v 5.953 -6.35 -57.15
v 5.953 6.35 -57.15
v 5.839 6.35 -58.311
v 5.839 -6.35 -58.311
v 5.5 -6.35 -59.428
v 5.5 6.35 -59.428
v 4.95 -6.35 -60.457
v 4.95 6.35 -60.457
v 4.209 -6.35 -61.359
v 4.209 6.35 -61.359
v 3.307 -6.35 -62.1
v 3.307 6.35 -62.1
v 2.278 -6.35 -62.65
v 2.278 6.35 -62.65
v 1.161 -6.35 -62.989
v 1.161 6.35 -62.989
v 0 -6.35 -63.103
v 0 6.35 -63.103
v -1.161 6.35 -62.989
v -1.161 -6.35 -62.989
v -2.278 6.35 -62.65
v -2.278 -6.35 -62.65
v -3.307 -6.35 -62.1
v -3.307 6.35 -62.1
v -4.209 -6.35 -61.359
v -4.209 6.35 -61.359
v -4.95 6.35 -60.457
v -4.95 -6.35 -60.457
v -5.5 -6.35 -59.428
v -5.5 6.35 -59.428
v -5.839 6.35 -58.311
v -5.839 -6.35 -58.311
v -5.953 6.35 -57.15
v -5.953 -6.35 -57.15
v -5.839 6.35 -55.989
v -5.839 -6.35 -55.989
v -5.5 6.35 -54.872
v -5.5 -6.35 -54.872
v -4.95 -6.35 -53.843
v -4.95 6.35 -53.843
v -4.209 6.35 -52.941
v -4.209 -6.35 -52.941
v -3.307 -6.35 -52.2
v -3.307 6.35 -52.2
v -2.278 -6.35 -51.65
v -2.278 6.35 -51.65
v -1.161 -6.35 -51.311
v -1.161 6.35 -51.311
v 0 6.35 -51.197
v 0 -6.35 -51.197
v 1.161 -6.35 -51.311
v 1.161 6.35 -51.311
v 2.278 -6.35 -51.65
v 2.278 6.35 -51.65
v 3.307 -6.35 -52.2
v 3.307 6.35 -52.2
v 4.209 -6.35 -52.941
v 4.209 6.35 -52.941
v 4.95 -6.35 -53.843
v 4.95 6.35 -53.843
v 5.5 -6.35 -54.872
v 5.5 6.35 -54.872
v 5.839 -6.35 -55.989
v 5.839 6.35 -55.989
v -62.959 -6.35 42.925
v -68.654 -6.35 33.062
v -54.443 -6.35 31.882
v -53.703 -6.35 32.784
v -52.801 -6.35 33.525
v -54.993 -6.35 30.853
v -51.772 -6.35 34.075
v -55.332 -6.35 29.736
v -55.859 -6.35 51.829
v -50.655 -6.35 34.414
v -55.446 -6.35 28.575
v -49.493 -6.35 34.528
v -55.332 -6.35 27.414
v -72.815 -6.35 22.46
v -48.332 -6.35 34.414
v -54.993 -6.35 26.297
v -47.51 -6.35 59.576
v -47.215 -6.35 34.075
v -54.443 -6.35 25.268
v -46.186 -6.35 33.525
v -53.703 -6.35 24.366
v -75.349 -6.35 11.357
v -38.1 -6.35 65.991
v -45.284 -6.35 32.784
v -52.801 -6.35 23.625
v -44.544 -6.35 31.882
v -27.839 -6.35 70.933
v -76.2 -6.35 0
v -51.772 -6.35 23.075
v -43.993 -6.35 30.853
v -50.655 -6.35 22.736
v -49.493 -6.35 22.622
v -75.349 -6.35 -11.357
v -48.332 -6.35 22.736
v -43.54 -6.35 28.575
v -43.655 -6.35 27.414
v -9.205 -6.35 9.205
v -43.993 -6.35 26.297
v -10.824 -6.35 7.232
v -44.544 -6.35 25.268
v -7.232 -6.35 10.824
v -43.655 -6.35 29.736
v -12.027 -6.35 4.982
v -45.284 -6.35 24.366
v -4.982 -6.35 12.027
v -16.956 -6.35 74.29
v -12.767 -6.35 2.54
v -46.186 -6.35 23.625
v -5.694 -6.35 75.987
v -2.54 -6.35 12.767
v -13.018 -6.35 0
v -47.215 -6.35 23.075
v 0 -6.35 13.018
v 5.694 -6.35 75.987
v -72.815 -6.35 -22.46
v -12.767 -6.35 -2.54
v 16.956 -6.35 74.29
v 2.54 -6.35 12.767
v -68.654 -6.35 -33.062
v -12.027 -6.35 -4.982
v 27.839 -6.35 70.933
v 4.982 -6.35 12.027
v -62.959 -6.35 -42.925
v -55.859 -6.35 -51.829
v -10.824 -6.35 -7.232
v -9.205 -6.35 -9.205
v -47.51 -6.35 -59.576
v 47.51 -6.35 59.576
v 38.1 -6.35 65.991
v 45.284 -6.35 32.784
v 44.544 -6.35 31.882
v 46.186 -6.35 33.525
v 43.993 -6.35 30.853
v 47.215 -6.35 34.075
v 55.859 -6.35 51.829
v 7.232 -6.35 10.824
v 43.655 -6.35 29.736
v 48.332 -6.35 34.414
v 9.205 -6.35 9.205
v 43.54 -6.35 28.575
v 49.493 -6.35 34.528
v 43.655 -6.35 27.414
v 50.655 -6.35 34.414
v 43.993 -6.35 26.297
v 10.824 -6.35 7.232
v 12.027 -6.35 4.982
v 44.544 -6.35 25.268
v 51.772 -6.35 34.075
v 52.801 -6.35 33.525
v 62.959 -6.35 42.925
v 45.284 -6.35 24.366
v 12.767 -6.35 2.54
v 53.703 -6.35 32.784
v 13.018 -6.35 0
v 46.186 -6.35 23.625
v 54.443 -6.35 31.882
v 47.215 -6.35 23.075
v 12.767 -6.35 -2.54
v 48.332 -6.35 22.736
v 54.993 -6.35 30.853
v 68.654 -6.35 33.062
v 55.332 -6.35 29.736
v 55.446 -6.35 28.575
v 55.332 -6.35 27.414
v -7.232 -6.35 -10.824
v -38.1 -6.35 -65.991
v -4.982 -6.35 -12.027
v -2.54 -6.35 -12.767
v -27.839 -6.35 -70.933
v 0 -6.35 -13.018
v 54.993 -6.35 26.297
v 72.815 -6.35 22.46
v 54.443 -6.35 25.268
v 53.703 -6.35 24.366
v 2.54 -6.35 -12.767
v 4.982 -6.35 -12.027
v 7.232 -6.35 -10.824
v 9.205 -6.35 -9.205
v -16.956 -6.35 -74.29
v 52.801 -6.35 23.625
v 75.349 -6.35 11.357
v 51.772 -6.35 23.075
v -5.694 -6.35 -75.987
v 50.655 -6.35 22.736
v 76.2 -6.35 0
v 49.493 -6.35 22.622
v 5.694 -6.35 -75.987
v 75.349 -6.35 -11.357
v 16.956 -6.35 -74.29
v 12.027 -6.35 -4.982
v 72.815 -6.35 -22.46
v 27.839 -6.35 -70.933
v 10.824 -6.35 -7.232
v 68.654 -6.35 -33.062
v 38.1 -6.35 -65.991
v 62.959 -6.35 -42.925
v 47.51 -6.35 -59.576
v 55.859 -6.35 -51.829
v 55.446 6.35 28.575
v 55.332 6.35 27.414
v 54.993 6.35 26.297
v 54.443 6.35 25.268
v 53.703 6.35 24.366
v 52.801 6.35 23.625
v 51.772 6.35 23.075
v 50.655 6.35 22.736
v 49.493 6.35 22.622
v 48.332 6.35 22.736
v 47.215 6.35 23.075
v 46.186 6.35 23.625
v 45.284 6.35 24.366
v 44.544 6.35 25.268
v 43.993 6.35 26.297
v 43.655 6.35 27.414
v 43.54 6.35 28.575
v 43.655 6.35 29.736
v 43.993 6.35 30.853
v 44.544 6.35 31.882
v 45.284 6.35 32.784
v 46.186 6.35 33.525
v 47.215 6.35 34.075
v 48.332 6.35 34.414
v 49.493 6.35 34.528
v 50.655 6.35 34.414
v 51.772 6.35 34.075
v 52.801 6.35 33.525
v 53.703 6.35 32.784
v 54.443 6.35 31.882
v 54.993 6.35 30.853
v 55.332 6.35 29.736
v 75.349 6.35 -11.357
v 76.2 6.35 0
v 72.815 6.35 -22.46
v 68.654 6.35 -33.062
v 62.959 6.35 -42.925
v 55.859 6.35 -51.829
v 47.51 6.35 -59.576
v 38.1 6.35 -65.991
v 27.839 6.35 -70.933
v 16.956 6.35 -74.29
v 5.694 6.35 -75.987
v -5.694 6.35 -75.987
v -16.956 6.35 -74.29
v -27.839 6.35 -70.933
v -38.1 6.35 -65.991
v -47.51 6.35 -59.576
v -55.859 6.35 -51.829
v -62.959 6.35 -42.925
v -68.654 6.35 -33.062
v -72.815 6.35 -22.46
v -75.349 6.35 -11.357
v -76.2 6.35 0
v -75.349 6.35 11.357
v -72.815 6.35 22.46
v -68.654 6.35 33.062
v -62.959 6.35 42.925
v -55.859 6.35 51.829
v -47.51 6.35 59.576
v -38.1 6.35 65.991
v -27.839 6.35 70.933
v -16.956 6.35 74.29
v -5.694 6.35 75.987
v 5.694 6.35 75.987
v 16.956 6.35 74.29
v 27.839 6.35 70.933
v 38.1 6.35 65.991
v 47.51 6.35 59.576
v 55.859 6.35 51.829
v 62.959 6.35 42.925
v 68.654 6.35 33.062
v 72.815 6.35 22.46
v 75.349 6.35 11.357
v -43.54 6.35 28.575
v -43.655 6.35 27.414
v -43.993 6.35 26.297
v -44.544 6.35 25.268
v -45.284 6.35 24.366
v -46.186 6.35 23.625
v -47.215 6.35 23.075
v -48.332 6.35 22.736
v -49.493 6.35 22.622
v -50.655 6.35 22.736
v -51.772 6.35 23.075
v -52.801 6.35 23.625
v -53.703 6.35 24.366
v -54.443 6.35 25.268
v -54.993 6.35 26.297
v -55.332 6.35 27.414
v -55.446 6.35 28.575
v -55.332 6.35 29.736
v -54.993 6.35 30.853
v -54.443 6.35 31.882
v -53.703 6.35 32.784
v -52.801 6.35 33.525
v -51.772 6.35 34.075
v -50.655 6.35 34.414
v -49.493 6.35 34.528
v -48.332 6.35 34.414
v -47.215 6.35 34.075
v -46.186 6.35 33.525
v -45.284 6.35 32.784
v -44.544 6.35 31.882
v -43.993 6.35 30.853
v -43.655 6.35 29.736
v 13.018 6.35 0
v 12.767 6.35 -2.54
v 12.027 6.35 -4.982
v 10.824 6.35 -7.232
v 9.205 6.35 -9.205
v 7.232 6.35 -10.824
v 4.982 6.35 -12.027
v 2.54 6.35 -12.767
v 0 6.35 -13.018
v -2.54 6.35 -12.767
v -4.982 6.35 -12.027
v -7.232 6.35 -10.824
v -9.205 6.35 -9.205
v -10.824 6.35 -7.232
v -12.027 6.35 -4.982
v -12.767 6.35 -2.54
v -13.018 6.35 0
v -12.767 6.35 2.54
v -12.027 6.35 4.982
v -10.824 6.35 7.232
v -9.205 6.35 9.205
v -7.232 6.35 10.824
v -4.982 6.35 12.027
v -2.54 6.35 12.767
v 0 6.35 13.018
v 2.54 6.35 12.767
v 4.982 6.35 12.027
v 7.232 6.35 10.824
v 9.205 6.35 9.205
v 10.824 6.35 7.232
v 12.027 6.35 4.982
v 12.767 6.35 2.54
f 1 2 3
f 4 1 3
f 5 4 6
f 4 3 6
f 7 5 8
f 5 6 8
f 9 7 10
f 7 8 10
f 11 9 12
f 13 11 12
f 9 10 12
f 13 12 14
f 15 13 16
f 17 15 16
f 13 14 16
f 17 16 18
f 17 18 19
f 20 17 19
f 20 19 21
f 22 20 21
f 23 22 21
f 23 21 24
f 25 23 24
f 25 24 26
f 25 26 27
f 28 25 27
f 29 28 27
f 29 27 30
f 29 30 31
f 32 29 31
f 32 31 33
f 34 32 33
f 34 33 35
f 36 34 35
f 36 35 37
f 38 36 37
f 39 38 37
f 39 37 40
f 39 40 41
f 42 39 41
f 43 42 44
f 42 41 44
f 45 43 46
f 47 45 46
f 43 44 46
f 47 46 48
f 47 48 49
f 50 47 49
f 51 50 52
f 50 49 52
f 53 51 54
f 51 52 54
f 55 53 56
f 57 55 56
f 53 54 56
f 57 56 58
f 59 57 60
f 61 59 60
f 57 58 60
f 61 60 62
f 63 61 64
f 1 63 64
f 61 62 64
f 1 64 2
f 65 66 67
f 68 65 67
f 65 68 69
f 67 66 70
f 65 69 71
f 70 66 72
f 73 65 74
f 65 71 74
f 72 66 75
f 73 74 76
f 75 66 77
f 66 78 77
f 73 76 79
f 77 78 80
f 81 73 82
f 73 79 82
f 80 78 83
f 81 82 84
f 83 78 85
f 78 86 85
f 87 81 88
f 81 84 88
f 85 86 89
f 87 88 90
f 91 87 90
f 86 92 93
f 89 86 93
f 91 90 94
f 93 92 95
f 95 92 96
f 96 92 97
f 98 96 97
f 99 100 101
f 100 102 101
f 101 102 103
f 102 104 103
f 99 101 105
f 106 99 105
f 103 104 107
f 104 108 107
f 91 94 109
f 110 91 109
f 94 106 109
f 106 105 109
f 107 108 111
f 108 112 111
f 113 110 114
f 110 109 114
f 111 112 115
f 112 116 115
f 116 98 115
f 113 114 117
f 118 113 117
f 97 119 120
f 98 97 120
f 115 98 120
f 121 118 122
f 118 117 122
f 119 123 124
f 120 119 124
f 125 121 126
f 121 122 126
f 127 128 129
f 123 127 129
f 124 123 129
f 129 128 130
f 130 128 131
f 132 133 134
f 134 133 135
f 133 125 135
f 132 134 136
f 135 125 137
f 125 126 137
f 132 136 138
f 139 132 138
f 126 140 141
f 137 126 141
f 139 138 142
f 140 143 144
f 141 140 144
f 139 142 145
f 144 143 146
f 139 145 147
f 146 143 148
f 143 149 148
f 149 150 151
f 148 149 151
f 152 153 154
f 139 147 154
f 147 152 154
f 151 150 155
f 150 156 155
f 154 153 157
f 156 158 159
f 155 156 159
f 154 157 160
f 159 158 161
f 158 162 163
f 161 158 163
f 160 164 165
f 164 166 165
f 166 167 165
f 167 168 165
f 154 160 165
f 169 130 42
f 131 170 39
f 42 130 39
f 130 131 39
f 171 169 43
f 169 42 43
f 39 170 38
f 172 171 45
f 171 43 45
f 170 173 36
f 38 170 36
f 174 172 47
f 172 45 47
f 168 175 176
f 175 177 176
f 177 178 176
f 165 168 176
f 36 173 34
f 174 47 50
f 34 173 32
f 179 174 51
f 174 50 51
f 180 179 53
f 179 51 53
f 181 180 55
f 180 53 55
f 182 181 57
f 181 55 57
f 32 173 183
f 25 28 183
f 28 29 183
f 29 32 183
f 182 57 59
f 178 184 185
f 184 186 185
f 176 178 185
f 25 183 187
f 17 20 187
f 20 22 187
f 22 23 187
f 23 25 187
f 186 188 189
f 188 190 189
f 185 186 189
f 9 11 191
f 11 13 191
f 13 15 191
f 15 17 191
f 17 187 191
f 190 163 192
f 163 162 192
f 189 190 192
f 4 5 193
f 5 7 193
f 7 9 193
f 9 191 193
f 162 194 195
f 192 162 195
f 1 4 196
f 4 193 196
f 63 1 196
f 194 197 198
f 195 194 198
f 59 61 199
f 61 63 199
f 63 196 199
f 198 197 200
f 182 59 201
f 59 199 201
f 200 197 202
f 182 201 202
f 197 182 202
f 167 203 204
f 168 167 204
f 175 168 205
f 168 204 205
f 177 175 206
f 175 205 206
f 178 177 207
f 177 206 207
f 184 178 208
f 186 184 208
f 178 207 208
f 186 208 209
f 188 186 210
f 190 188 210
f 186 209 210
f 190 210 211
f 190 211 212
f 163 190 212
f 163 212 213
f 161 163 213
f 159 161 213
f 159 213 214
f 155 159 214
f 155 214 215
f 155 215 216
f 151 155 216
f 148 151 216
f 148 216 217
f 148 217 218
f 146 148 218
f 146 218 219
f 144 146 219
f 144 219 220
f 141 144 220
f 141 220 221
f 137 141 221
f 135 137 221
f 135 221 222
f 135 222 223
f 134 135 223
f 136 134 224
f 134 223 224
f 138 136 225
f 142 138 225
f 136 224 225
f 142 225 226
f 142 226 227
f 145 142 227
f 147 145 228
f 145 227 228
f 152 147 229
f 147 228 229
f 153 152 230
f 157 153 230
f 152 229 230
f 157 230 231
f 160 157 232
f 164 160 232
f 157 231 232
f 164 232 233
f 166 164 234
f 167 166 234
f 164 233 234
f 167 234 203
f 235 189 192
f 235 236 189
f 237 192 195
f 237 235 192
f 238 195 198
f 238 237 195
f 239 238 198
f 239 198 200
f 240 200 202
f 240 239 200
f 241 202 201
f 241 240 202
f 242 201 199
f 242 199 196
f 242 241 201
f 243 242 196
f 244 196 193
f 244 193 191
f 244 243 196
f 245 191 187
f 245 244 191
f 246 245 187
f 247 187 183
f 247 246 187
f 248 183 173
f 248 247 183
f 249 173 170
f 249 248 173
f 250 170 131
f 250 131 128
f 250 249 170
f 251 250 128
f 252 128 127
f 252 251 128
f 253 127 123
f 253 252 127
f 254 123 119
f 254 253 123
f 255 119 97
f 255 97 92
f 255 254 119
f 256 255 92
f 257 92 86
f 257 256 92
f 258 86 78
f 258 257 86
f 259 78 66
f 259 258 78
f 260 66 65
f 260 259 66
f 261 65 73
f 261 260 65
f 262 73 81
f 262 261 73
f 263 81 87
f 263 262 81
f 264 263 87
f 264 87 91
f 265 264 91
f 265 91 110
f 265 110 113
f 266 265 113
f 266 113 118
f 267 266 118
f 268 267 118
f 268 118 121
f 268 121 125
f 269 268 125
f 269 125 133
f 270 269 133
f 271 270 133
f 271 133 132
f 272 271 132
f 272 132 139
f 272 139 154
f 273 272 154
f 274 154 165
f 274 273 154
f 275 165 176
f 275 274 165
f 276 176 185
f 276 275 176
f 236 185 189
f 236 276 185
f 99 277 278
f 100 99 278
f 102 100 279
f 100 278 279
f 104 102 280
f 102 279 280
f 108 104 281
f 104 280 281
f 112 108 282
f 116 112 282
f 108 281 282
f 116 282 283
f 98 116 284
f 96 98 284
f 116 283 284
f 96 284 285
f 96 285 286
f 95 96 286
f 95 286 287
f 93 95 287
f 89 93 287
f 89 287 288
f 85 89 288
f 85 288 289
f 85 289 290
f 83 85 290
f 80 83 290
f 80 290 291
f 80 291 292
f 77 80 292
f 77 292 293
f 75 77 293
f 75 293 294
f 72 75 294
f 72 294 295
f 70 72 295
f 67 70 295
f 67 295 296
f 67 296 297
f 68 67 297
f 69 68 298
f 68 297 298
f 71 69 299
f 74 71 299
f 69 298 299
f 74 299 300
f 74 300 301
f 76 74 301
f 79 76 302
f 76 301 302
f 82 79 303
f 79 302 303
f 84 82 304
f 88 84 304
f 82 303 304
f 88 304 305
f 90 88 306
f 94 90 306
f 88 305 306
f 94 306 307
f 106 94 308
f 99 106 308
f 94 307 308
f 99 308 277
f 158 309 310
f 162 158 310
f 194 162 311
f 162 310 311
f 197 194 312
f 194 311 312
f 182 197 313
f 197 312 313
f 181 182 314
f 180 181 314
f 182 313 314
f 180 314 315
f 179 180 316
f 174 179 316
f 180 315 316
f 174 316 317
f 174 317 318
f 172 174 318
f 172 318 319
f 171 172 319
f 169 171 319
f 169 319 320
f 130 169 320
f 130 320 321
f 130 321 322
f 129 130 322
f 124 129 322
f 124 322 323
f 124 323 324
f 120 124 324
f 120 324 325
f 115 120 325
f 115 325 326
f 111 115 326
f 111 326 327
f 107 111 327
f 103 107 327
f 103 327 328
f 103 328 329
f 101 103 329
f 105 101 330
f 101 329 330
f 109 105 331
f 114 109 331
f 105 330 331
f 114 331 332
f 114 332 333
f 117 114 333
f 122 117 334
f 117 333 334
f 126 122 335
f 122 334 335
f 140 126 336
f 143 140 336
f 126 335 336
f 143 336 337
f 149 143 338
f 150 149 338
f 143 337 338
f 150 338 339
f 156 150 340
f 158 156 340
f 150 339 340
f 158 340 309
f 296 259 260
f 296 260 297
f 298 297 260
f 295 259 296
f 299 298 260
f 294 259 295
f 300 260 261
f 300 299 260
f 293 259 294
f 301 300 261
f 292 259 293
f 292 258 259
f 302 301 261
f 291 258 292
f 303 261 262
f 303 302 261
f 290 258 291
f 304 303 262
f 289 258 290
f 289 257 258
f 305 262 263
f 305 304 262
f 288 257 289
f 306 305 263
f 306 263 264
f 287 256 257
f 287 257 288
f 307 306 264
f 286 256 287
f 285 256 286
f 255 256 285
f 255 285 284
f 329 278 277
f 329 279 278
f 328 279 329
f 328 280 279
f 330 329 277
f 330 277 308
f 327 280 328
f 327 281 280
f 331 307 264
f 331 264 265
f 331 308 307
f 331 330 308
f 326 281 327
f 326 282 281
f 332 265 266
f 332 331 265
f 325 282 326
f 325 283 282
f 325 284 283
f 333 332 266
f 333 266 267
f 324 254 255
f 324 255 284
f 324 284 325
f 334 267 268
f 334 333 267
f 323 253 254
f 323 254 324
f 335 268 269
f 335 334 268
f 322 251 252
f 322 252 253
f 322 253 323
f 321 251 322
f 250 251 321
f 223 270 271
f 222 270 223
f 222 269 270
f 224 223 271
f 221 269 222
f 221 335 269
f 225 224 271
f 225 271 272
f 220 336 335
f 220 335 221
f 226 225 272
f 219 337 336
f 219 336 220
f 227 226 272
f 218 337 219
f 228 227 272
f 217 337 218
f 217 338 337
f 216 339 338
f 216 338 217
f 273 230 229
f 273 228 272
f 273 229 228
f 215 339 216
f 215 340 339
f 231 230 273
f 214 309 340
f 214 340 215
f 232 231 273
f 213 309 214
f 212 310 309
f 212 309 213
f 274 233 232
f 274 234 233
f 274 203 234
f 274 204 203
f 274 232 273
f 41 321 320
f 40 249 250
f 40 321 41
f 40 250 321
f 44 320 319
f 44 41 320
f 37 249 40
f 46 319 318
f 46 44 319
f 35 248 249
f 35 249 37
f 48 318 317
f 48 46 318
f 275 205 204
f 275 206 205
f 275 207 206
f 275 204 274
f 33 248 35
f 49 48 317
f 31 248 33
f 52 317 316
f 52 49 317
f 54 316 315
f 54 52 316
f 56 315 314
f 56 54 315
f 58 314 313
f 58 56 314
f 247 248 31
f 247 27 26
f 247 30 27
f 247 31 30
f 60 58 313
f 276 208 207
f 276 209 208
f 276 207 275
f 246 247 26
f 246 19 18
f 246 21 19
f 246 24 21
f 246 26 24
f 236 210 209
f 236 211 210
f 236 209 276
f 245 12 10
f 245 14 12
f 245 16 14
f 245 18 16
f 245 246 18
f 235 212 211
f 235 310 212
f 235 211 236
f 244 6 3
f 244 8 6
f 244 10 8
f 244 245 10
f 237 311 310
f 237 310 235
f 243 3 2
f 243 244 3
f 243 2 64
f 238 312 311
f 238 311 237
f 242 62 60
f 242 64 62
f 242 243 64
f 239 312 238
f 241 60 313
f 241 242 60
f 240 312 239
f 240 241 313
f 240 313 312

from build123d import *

# Parameters (mm, degrees)
SKETCH3_R                = 76.2
BOSS_EXTRUDE1_DEPTH      = 6.35
BOSS_EXTRUDE1_DEPTH_BACK = 6.35
SKETCH4_R                = 13.0175
SKETCH4_R_2              = 5.953125
CUT_EXTRUDE1_DEPTH       = 13.7


with BuildPart() as part:
    # Sketch3 → Boss-Extrude1 (new body, two sides)
    with BuildSketch(Plane(origin=(0, 0, 0), x_dir=(1, 0, 0), z_dir=(0, 1, 0))) as boss_extrude1_sk:
        Circle(SKETCH3_R)
    extrude(amount=BOSS_EXTRUDE1_DEPTH)
    extrude(boss_extrude1_sk.sketch, amount=-BOSS_EXTRUDE1_DEPTH_BACK)

    # Sketch4 → Cut-Extrude1 (cut, through all)
    with BuildSketch(Plane(origin=(0, 6.35, 0), x_dir=(1, 0, 0), z_dir=(0, 1, 0))):
        Circle(SKETCH4_R)
        with Locations((0, 57.15)):
            Circle(SKETCH4_R_2)
        with Locations((49.493351826, -28.575)):
            Circle(SKETCH4_R_2)
        with Locations((-49.493351826, -28.575)):
            Circle(SKETCH4_R_2)
    extrude(amount=-CUT_EXTRUDE1_DEPTH, mode=Mode.SUBTRACT)


solid = part.part
